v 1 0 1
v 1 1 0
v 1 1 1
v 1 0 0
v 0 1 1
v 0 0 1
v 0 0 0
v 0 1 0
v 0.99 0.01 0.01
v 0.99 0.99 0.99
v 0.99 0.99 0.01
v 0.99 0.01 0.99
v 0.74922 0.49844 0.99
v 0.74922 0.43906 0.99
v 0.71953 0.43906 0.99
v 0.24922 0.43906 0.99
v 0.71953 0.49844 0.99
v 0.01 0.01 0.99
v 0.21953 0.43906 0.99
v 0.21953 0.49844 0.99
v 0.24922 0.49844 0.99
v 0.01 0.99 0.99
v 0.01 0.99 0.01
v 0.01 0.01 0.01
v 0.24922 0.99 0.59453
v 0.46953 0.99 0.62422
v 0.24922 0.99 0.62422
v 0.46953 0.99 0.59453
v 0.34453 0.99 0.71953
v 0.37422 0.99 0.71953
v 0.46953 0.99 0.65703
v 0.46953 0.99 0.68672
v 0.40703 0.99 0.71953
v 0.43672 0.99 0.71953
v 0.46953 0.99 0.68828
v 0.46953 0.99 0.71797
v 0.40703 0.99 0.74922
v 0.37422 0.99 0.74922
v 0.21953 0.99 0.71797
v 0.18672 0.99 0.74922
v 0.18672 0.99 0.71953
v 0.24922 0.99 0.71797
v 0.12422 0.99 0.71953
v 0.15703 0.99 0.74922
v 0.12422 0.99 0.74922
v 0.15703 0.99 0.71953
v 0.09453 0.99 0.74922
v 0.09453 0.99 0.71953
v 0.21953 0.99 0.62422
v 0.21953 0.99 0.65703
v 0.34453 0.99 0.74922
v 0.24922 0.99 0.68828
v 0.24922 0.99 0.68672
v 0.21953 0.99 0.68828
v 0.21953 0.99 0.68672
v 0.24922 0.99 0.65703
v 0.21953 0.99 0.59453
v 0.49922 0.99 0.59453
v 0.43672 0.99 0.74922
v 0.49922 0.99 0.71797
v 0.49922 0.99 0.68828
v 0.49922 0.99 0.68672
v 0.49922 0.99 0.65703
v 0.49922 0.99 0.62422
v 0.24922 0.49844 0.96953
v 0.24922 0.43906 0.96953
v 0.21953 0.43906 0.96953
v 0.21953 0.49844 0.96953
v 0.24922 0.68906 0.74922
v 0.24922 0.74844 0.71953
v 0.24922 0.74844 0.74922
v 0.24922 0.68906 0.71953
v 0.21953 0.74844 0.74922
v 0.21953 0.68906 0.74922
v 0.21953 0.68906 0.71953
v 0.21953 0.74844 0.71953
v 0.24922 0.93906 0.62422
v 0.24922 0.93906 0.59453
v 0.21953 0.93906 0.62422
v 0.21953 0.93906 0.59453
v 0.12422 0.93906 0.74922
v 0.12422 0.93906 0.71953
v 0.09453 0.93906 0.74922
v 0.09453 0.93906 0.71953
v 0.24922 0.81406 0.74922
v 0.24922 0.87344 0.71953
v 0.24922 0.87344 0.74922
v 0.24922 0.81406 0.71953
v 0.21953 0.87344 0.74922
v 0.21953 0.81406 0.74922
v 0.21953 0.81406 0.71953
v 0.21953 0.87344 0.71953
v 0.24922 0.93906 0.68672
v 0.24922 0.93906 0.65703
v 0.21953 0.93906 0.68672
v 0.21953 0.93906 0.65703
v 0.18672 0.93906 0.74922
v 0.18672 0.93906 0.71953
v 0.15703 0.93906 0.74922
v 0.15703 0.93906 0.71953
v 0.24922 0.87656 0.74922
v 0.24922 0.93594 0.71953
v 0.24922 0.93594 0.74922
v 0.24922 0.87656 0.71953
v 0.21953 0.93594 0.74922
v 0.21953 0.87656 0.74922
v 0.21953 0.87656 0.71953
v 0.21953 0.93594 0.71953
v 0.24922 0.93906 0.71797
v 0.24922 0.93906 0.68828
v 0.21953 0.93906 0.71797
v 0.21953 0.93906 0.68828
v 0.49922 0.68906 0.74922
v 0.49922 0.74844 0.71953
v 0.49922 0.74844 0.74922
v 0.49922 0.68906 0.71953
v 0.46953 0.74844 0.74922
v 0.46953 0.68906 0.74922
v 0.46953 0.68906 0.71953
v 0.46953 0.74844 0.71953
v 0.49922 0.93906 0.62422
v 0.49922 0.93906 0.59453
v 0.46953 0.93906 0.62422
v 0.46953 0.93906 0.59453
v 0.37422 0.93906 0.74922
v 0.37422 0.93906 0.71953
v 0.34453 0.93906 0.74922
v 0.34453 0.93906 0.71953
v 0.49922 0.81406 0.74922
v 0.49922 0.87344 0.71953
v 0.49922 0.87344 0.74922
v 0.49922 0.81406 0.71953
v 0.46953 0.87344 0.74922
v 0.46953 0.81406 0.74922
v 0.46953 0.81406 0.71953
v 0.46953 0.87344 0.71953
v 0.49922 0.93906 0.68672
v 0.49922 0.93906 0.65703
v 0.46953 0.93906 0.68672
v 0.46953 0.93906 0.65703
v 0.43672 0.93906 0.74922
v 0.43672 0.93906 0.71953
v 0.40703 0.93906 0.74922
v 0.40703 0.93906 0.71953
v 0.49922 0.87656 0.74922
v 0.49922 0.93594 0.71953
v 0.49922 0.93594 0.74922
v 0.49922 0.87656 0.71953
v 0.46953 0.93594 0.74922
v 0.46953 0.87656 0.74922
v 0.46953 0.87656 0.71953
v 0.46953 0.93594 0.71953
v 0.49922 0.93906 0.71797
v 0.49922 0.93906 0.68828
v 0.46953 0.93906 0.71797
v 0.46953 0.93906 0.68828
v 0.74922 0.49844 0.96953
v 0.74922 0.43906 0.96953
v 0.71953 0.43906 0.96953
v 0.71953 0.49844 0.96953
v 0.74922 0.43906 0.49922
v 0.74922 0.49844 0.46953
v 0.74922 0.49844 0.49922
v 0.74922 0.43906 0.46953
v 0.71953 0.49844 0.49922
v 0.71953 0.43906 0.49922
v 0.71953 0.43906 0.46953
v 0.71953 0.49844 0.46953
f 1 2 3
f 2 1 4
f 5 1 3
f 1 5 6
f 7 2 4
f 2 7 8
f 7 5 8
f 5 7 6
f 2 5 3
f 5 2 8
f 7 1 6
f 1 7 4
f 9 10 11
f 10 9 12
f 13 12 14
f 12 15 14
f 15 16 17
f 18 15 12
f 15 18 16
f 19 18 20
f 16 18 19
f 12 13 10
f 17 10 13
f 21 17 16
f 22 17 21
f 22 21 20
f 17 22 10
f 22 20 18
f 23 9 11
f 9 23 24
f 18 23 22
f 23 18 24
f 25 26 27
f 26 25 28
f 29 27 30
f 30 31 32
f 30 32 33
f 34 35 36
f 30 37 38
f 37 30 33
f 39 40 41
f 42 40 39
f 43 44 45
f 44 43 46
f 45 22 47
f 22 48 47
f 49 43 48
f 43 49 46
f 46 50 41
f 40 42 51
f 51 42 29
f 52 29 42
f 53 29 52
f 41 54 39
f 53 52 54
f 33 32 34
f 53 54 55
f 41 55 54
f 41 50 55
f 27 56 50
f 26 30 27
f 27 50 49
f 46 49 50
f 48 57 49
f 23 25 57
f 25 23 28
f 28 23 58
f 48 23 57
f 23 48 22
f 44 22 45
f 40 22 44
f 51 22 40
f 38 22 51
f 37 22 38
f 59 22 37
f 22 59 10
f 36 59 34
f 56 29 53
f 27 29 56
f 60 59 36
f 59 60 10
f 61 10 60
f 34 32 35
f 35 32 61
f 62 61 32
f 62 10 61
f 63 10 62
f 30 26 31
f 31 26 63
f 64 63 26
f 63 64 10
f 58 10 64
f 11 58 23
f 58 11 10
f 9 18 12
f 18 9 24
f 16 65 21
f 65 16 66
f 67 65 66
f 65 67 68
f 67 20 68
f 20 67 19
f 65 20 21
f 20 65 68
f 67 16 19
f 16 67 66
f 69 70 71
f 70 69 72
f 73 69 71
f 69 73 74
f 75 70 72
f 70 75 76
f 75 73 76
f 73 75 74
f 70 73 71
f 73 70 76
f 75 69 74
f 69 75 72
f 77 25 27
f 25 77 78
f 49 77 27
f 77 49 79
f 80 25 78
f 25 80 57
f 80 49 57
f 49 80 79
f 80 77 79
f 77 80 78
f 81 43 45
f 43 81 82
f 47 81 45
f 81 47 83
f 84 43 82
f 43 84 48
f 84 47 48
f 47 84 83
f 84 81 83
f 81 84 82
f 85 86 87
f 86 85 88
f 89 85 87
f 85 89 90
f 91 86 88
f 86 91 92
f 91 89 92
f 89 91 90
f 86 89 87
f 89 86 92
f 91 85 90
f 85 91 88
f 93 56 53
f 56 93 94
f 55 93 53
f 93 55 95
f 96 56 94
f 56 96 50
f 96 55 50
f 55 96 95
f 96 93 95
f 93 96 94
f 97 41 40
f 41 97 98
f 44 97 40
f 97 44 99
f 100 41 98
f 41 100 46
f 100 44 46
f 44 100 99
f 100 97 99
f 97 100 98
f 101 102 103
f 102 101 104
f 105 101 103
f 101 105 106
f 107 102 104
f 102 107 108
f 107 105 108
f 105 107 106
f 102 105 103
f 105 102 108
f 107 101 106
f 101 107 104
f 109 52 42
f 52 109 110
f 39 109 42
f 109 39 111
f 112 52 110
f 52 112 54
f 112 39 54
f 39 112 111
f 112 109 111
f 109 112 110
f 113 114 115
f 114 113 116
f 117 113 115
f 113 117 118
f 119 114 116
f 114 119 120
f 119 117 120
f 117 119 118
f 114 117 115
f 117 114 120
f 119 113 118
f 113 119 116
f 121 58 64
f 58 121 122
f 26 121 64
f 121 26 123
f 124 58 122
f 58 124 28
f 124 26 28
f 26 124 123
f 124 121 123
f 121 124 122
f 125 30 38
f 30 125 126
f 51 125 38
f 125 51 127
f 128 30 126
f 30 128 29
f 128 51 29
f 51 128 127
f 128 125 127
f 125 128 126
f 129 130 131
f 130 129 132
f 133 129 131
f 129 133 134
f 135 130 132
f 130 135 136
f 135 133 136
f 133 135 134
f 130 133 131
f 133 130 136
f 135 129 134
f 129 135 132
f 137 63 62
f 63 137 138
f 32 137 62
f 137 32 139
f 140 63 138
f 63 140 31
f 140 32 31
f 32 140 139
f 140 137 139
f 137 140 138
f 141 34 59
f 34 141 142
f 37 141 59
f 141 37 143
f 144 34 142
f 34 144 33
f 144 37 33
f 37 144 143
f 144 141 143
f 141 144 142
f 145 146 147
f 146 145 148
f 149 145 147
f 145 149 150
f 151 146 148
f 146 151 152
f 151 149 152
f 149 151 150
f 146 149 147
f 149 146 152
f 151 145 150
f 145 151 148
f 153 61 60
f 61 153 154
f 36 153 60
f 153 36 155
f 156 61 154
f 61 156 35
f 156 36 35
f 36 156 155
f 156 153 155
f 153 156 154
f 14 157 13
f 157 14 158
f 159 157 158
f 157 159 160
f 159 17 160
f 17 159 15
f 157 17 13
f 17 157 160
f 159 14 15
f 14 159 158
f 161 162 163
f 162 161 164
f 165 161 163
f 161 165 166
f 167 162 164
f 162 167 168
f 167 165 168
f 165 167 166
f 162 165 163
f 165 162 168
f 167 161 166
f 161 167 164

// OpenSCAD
translate([0.234375, 0.46875, 0.984375]) color([0.08904657500791346, 0.3931071469318598, 0.8487359536466026]) cube([0.0296875, 0.059375, 0.0296875], center=true);
translate([0.234375, 0.71875, 0.734375]) color([0.0867533608619423, 0.22460025621935065, 0.7061435302974284]) cube([0.0296875, 0.059375, 0.0296875], center=true);
translate([0.234375, 0.96875, 0.609375]) color([0.4350610505499607, 0.7589672040693038, 0.9236035535504495]) cube([0.0296875, 0.059375, 0.0296875], center=true);
translate([0.109375, 0.96875, 0.734375]) color([0.34632746473422715, 0.6816230197457407, 0.7943831415029751]) cube([0.0296875, 0.059375, 0.0296875], center=true);
translate([0.234375, 0.84375, 0.734375]) color([0.942504490582312, 0.473346446137602, 0.7161673519048236]) cube([0.0296875, 0.059375, 0.0296875], center=true);
translate([0.234375, 0.96875, 0.671875]) color([0.17126186242099173, 0.20809823861174936, 0.037537259147380264]) cube([0.0296875, 0.059375, 0.0296875], center=true);
translate([0.171875, 0.96875, 0.734375]) color([0.05982535370915176, 0.2980849110955961, 0.5143581520560875]) cube([0.0296875, 0.059375, 0.0296875], center=true);
translate([0.234375, 0.90625, 0.734375]) color([0.23402983749105855, 0.1052132302970884, 0.5112992240299845]) cube([0.0296875, 0.059375, 0.0296875], center=true);
translate([0.234375, 0.96875, 0.703125]) color([0.39514452521644217, 0.49443874030740664, 0.6361757331239836]) cube([0.0296875, 0.059375, 0.0296875], center=true);
translate([0.484375, 0.71875, 0.734375]) color([0.32038211561794017, 0.4803002090263846, 0.015166543656829456]) cube([0.0296875, 0.059375, 0.0296875], center=true);
translate([0.484375, 0.96875, 0.609375]) color([0.6128858101754131, 0.49087643225993083, 0.33072373349569295]) cube([0.0296875, 0.059375, 0.0296875], center=true);
translate([0.359375, 0.96875, 0.734375]) color([0.8311759580110917, 0.6530289889478958, 0.2958952670101137]) cube([0.0296875, 0.059375, 0.0296875], center=true);
translate([0.484375, 0.84375, 0.734375]) color([0.2473894483611605, 0.36970874869798787, 0.7952548456406074]) cube([0.0296875, 0.059375, 0.0296875], center=true);
translate([0.484375, 0.96875, 0.671875]) color([0.9989837283716566, 0.9655087457090868, 0.07994277047486842]) cube([0.0296875, 0.059375, 0.0296875], center=true);
translate([0.421875, 0.96875, 0.734375]) color([0.49095485894955837, 0.3162989652622308, 0.6431483467055742]) cube([0.0296875, 0.059375, 0.0296875], center=true);
translate([0.484375, 0.90625, 0.734375]) color([0.6316935662950548, 0.12536482633084522, 0.25737390859418263]) cube([0.0296875, 0.059375, 0.0296875], center=true);
translate([0.484375, 0.96875, 0.703125]) color([0.6158048265397639, 0.536486801315167, 0.32353881396569284]) cube([0.0296875, 0.059375, 0.0296875], center=true);
translate([0.734375, 0.46875, 0.984375]) color([0.7722876871759491, 0.03424550897432965, 0.17244045160910815]) cube([0.0296875, 0.059375, 0.0296875], center=true);
translate([0.734375, 0.46875, 0.484375]) color([0.489282834009923, 0.9100674339625596, 0.14568508237411337]) cube([0.0296875, 0.059375, 0.0296875], center=true);
color([0.3,0.3,0.3,0.3]) difference() { cube([1,1,1]); translate([0.01,0.01,0.01]) cube([0.98,0.98,0.98]); }
